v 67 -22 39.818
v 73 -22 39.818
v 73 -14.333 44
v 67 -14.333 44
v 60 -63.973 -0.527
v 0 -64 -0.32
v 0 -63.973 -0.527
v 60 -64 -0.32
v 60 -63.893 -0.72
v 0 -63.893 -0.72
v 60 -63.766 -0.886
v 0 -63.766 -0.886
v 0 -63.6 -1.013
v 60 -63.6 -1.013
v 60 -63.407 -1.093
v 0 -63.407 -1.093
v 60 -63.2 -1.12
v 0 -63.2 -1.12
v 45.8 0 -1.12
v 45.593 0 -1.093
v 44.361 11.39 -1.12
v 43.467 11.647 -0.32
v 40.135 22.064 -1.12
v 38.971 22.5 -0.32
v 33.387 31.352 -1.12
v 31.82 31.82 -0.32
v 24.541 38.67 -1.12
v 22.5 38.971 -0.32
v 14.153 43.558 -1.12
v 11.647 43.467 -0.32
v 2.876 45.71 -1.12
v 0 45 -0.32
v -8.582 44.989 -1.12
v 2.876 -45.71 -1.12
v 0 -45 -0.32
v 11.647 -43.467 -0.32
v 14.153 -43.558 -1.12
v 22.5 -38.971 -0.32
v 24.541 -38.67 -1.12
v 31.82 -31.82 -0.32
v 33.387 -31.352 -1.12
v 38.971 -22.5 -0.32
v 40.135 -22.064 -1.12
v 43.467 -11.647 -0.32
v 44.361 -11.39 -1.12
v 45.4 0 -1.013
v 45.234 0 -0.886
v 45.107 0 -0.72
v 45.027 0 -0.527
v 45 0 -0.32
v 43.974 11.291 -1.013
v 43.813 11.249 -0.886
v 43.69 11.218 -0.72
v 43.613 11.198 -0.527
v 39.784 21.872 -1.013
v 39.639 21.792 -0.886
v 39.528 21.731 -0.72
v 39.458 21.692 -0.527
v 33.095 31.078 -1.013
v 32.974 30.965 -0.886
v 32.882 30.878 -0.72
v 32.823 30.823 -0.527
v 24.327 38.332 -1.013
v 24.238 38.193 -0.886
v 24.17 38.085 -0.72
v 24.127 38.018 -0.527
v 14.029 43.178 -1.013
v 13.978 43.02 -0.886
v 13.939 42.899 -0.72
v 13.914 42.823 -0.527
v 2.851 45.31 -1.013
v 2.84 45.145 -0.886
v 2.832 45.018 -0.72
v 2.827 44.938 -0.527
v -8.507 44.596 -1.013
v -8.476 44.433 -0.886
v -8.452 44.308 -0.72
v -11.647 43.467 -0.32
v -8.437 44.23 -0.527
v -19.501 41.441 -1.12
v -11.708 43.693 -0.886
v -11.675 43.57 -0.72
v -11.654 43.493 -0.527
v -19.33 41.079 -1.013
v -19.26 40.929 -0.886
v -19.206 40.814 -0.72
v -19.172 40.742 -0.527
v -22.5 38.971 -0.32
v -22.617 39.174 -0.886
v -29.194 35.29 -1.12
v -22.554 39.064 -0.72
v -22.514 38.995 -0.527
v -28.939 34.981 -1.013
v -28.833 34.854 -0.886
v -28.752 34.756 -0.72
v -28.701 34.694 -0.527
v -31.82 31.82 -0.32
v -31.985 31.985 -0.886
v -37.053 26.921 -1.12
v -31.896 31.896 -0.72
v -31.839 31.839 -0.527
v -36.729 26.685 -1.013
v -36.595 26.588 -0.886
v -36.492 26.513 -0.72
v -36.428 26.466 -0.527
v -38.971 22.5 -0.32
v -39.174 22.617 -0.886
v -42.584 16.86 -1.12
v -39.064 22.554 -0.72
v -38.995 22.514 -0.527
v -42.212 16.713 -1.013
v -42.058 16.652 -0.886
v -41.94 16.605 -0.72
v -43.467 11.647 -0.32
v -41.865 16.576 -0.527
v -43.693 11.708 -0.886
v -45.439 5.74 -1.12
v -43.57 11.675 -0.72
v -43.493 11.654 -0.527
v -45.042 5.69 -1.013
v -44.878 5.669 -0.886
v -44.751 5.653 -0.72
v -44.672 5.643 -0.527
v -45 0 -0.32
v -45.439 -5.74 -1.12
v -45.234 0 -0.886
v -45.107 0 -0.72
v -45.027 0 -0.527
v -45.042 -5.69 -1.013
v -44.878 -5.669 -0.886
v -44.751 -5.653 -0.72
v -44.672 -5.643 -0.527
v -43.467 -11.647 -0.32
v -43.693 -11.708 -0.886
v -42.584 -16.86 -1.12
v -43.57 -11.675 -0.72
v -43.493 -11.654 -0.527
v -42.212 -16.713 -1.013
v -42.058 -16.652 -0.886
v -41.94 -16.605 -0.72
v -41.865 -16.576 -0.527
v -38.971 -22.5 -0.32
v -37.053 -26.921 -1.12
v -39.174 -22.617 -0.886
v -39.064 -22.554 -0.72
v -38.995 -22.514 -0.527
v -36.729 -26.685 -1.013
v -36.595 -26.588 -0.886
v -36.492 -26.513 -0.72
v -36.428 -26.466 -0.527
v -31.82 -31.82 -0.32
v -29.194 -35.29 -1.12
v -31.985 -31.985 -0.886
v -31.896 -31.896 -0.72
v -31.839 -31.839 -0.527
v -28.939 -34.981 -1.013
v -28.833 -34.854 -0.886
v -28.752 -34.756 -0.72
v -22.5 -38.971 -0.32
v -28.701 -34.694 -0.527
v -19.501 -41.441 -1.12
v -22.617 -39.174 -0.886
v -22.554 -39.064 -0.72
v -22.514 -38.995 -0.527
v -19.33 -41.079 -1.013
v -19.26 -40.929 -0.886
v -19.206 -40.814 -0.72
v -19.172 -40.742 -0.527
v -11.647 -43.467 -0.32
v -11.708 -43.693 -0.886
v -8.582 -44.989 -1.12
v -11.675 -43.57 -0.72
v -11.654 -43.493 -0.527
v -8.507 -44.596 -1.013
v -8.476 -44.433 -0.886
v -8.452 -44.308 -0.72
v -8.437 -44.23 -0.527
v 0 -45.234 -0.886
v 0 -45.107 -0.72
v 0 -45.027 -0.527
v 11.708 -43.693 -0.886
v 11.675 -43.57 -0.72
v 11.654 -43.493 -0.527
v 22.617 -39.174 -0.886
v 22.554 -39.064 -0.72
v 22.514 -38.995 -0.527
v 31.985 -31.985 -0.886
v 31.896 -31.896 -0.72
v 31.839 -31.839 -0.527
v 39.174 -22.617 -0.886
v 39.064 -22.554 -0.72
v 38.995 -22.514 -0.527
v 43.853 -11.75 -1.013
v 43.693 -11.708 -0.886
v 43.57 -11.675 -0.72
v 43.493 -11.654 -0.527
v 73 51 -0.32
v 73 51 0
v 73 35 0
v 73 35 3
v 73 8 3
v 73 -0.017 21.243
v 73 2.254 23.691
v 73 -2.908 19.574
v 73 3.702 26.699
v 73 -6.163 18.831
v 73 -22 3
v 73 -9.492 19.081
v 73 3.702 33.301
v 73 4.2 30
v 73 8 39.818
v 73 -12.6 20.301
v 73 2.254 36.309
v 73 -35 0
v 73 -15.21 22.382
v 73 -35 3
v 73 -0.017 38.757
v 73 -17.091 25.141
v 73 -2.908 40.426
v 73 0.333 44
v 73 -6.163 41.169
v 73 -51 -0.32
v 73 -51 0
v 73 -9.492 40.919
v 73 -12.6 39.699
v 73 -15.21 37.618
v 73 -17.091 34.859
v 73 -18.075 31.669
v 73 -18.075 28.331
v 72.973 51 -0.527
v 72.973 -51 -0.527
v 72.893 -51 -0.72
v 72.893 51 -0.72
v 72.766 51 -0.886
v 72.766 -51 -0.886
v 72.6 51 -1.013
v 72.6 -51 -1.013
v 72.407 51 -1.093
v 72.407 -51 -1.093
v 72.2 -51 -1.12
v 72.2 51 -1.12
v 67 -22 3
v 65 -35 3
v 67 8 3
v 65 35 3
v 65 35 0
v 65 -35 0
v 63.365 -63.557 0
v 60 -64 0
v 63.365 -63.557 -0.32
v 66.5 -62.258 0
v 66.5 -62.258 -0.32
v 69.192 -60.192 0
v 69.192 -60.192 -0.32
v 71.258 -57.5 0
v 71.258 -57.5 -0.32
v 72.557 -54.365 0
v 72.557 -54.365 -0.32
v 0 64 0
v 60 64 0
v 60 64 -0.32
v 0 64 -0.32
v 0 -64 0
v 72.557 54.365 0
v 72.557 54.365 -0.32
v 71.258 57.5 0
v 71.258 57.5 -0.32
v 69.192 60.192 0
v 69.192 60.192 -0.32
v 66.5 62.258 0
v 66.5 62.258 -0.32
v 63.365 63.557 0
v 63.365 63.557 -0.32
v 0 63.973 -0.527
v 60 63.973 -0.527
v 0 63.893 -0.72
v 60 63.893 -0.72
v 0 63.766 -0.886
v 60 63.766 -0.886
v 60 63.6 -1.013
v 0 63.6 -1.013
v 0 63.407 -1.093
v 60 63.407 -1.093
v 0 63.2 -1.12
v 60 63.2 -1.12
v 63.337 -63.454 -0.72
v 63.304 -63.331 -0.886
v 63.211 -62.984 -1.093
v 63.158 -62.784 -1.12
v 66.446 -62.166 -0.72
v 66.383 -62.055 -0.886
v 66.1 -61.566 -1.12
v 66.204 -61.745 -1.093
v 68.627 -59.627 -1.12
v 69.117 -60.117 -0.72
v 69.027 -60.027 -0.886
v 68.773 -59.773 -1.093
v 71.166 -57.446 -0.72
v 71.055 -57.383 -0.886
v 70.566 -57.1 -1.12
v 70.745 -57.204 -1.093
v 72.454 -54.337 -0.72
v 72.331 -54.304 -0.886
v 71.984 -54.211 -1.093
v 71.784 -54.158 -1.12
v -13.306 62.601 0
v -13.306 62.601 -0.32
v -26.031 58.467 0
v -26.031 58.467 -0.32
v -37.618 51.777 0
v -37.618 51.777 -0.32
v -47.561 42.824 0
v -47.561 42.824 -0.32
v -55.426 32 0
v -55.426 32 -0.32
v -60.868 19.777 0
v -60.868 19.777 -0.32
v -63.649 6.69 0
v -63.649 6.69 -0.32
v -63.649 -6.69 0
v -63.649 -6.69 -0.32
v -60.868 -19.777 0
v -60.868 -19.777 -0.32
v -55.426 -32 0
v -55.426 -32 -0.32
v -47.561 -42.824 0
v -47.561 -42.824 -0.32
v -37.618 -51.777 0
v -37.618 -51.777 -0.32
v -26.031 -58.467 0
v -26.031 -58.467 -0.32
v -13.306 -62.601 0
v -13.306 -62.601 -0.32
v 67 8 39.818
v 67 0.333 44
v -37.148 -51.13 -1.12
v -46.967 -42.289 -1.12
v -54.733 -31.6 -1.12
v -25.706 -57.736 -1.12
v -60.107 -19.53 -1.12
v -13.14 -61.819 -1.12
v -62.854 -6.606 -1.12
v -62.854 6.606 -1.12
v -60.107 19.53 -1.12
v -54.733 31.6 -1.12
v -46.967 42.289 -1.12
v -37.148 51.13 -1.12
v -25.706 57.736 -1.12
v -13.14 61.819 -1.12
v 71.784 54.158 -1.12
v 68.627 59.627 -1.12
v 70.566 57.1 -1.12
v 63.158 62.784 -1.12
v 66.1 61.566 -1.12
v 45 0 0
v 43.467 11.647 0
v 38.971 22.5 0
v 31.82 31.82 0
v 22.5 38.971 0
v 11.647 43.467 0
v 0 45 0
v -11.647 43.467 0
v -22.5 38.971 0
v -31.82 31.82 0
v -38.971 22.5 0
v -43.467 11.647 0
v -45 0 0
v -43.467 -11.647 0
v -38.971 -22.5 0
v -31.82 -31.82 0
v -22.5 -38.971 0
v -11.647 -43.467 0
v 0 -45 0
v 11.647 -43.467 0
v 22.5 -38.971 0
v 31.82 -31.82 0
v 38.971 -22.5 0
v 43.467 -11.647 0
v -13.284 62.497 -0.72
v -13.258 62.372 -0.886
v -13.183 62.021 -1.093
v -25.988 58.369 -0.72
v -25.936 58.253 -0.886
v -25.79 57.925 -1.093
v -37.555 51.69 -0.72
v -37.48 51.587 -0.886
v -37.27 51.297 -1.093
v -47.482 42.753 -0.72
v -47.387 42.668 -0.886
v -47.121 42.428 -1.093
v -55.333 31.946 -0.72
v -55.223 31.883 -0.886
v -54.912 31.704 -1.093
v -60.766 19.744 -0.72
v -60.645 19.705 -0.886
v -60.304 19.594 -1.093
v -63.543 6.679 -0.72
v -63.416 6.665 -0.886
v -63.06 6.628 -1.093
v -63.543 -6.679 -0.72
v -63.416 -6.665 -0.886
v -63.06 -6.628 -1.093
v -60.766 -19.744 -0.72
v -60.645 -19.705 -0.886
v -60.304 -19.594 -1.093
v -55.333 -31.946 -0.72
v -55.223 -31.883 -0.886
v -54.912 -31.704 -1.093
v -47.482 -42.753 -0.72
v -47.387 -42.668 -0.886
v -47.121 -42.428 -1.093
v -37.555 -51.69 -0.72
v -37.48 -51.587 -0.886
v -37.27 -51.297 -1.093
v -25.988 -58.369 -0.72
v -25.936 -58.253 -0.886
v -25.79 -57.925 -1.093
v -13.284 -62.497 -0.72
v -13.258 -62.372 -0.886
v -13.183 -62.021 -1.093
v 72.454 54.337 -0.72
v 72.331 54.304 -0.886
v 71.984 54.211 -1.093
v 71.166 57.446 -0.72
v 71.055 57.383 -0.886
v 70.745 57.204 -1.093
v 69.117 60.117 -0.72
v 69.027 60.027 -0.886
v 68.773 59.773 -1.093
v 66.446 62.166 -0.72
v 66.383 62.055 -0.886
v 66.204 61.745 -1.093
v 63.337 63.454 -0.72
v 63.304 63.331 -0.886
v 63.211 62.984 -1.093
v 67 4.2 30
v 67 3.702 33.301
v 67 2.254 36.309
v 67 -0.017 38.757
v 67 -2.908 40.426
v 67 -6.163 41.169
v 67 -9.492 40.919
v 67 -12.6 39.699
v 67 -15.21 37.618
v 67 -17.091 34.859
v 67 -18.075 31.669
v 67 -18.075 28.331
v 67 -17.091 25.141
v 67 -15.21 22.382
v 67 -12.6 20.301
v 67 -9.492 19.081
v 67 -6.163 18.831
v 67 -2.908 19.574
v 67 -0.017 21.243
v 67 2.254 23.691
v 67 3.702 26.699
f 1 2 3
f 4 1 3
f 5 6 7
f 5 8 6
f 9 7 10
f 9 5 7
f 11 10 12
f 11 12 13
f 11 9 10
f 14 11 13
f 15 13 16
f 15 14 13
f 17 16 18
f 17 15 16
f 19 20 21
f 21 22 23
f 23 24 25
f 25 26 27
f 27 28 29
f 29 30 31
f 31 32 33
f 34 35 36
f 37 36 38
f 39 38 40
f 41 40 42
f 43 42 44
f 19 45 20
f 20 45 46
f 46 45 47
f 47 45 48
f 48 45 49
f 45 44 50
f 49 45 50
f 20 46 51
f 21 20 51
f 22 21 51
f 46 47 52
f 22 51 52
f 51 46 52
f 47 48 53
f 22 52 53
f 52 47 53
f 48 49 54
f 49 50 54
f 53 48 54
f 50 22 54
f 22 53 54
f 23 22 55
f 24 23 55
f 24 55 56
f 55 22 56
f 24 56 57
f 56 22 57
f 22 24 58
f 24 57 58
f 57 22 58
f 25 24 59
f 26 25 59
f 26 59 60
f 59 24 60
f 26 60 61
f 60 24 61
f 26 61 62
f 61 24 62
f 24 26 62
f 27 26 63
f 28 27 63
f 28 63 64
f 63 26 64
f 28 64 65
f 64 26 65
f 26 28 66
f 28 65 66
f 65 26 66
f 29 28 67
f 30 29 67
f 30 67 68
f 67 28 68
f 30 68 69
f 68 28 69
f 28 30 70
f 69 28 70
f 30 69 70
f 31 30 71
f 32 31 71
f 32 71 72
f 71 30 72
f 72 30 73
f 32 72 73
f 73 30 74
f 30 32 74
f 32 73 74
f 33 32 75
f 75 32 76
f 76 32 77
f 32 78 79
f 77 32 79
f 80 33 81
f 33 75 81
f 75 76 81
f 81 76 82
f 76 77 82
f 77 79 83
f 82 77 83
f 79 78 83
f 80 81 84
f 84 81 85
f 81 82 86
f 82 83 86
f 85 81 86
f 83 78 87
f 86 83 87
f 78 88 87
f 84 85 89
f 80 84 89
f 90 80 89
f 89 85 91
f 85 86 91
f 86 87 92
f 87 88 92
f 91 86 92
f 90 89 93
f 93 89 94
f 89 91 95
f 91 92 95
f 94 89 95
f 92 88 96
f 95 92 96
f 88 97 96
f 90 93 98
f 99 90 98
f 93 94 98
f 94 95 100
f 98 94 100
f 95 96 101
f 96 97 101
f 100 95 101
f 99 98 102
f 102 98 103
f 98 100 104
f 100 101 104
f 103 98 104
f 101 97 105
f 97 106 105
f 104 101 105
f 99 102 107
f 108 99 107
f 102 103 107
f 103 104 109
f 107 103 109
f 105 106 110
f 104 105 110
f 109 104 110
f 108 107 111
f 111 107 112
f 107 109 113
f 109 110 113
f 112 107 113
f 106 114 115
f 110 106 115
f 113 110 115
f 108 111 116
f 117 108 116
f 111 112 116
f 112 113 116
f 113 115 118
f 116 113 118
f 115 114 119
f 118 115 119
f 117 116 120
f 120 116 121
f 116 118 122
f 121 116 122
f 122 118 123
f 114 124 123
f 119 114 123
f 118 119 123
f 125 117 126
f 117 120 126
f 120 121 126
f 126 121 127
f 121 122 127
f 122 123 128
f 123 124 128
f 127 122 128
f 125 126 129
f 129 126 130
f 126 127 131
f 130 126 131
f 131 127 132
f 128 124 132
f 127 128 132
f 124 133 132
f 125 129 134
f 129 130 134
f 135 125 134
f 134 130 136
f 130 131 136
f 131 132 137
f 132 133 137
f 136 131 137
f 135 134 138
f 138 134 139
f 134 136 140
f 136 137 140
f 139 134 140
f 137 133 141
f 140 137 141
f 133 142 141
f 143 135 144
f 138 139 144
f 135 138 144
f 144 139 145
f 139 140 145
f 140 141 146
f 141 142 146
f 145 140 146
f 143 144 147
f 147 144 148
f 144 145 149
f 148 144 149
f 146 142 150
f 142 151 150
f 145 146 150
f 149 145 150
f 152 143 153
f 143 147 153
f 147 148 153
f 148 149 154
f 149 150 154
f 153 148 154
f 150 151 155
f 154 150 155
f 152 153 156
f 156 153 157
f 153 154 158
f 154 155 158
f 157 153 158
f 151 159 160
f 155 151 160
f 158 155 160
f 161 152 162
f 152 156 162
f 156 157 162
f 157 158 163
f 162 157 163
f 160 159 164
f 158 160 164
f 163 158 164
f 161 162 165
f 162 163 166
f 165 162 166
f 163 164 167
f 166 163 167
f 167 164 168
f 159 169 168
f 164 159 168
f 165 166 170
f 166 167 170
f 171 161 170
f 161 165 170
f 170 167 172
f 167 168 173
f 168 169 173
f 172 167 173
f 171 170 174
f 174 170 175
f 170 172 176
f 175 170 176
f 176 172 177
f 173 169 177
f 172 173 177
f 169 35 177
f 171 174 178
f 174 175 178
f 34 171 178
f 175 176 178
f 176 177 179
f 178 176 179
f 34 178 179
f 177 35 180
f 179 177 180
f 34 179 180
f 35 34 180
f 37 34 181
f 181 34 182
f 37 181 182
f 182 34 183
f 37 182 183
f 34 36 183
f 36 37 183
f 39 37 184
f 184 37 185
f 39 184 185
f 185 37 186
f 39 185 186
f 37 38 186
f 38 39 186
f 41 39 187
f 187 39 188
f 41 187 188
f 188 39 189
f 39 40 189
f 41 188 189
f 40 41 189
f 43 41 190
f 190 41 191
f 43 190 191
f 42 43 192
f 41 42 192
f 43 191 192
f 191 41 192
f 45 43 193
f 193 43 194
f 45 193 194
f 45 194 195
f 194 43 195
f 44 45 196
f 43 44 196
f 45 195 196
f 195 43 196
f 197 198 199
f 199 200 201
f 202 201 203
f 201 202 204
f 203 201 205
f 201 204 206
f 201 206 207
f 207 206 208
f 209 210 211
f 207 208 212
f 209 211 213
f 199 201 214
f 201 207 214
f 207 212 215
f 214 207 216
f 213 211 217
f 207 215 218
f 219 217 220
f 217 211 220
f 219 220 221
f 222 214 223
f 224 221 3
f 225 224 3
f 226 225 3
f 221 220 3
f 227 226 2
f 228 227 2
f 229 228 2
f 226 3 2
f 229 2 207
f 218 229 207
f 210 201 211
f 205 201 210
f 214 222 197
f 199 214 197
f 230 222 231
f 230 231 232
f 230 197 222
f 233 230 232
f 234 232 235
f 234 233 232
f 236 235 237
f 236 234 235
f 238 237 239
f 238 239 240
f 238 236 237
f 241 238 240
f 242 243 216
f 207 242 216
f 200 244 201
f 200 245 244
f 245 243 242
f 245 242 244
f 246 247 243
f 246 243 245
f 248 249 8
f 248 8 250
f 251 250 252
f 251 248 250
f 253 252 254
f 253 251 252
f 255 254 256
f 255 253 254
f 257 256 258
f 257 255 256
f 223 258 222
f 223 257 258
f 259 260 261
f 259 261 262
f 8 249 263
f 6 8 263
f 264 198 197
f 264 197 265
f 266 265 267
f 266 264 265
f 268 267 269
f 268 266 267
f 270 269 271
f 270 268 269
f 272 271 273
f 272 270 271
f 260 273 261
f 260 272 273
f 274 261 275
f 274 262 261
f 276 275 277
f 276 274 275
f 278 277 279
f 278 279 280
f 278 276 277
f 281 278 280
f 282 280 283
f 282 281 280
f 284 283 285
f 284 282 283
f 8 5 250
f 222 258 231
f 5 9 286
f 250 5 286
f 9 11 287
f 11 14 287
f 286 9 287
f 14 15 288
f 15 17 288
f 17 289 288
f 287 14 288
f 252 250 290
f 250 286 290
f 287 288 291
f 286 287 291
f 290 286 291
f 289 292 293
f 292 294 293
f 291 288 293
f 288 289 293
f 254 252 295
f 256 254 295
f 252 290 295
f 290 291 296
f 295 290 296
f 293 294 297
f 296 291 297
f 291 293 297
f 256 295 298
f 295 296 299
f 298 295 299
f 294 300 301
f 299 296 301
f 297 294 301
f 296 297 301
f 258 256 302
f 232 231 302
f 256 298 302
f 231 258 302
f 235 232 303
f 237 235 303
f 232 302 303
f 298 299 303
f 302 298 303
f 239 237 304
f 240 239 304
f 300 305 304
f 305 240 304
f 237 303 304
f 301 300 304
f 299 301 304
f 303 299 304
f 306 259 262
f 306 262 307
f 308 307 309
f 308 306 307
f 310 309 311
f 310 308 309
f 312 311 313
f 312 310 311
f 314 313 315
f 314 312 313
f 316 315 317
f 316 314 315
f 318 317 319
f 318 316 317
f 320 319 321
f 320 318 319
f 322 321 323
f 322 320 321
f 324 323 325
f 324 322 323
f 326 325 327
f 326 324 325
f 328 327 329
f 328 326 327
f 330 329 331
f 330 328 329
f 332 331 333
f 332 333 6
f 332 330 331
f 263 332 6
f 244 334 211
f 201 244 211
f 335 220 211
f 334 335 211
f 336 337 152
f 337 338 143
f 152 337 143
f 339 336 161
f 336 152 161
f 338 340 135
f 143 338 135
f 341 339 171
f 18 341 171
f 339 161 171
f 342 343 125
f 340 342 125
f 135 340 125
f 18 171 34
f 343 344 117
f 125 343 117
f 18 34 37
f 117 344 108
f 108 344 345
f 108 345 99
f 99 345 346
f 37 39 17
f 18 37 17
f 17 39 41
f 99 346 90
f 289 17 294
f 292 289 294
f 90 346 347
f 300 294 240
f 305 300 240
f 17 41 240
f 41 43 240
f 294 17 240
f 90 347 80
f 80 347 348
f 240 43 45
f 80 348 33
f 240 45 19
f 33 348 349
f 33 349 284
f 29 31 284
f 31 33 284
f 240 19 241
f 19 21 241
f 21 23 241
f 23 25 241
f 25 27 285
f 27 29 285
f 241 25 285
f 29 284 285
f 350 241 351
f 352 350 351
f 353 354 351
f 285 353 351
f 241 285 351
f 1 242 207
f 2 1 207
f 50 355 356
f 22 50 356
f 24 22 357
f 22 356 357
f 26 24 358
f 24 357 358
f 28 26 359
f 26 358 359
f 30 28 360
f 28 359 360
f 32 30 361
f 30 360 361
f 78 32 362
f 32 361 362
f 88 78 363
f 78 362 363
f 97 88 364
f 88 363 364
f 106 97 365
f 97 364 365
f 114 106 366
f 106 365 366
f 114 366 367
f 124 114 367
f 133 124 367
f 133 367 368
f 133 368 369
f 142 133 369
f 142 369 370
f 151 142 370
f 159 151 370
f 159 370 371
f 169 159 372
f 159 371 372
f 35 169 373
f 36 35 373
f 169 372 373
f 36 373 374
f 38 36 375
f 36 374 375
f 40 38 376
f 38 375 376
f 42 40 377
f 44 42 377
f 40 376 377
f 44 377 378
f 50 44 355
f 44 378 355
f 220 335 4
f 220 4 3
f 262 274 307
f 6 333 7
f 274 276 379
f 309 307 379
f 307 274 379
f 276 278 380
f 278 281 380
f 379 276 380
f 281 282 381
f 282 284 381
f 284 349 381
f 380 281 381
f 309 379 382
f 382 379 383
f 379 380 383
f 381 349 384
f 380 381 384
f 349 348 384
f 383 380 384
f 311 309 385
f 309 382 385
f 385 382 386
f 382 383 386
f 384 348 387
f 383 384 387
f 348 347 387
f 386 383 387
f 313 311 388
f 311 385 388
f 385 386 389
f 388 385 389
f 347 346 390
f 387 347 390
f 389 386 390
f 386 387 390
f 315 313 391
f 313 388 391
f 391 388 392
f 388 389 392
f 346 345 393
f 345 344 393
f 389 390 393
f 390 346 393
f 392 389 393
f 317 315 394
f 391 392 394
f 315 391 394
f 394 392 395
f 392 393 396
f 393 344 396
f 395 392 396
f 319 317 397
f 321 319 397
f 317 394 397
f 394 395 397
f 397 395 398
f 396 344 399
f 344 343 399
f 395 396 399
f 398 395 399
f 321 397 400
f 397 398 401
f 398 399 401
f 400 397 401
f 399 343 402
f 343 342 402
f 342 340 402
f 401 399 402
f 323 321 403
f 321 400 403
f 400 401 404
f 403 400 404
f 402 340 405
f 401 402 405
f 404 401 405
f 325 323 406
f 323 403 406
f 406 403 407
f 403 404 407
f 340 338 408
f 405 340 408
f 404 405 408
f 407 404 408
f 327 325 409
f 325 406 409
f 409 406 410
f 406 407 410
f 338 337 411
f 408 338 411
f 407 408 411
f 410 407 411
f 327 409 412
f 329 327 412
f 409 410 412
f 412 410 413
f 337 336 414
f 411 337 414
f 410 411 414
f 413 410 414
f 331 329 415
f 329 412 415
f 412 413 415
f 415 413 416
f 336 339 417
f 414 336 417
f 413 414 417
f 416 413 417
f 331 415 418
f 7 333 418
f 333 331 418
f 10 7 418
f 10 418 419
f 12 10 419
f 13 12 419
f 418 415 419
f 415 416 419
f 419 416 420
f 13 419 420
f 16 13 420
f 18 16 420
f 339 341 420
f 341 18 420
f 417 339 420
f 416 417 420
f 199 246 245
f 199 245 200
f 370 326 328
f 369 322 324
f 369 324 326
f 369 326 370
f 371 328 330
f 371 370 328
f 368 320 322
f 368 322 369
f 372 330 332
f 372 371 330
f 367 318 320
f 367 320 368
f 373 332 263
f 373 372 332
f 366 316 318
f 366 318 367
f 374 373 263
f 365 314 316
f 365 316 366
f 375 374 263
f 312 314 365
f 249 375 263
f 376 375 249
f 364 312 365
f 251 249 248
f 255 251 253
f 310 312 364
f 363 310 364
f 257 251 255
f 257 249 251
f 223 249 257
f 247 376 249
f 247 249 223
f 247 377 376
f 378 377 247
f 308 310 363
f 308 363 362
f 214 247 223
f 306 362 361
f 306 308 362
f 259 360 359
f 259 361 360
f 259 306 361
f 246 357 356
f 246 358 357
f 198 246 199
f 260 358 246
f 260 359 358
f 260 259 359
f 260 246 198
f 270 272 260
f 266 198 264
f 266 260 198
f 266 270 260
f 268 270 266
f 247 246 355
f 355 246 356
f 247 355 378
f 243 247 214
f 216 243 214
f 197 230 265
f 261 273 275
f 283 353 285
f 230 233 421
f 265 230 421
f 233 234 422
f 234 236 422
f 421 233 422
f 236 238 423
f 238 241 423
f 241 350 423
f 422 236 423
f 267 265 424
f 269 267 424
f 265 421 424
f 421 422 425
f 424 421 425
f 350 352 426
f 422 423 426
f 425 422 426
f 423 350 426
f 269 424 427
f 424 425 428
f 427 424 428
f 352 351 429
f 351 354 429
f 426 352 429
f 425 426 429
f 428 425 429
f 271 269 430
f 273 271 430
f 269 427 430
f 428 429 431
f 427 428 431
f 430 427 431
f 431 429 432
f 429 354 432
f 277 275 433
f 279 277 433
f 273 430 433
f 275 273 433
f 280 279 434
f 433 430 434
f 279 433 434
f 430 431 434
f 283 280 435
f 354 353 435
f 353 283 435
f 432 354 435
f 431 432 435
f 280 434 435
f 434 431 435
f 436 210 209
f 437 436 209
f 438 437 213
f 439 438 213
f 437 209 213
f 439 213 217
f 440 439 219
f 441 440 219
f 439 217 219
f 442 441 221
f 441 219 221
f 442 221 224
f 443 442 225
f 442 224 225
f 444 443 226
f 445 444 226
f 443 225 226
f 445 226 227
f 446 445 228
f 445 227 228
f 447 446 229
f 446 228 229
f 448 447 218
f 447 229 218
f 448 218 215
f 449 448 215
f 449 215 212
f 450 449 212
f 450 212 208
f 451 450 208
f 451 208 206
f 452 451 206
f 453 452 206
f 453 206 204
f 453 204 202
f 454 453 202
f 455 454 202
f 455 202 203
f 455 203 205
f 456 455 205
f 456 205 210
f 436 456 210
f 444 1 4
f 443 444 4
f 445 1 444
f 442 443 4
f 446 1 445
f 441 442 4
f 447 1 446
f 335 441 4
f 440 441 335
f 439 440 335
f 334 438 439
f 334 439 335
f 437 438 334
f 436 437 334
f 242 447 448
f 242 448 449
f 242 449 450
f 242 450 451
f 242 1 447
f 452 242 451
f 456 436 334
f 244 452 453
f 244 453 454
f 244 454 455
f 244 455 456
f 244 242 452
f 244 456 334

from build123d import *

# Parameters (mm, degrees)
SKETCH001_R     = 45
PAD_DEPTH       = 1.12
SKETCH_W        = 8
SKETCH_H        = 70
PAD003_DEPTH    = 3
SKETCH008_W     = 6
SKETCH008_H     = 30
PAD004_DEPTH    = 41
SKETCH009_R     = 11.2
POCKET003_DEPTH = 137.0009178097
POCKET004_DEPTH = 137.0009178097
FILLET_R        = 0.8


with BuildPart() as part:
    # Sketch001 → Pad (new body)
    with BuildSketch(Plane.XY):
        with BuildLine():
            Line((60, 64), (0, 64))
            ThreePointArc((0, 63.9999999999), (-63.9999178097, 0), (0, -63.9999999999))
            Line((60, -63.9999999999), (0, -63.9999999999))
            ThreePointArc((60, -64), (69.1923881554, -60.1923881554), (73, -51))
            Line((73, 51), (73, -51))
            ThreePointArc((73, 51), (69.1923881554, 60.1923881554), (60, 64))
        make_face()
        Circle(SKETCH001_R, mode=Mode.SUBTRACT)
    extrude(amount=-PAD_DEPTH)

    # Sketch → Pad003 (new body)
    with BuildSketch(Plane.XY):
        with Locations((69, 0)):
            Rectangle(SKETCH_W, SKETCH_H)
    extrude(amount=PAD003_DEPTH)

    # Sketch008 → Pad004 (new body)
    with BuildSketch(Plane.XY.offset(3)):
        with Locations((70, -7)):
            Rectangle(SKETCH008_W, SKETCH008_H)
    extrude(amount=PAD004_DEPTH)

    # Sketch009 → Pocket003 (cut, through all)
    with BuildSketch(Plane.YZ.offset(73)):
        with Locations((-7, 30)):
            Circle(SKETCH009_R)
    extrude(amount=-POCKET003_DEPTH, mode=Mode.SUBTRACT)

    # Sketch010 → Pocket004 (cut, through all)
    with BuildSketch(Plane.YZ.offset(73)):
        Polygon((-7, 48), (15, 36), (15, 54.3744), (-29, 54.3744), (-29, 36), align=None)
    extrude(amount=-POCKET004_DEPTH, mode=Mode.SUBTRACT)

    # Fillet
    fillet_edges = [part.edges().sort_by_distance(p)[0] for p in [
        (69.192388, 60.192388, -1.12),
        (30, 64, -1.12),
        (-63.999918, 0, -1.12),
        (30, -64, -1.12),
        (69.192388, -60.192388, -1.12),
        (73, 0, -1.12),
        (-45, 0, -1.12),
    ]]
    fillet(fillet_edges, radius=FILLET_R)


solid = part.part
